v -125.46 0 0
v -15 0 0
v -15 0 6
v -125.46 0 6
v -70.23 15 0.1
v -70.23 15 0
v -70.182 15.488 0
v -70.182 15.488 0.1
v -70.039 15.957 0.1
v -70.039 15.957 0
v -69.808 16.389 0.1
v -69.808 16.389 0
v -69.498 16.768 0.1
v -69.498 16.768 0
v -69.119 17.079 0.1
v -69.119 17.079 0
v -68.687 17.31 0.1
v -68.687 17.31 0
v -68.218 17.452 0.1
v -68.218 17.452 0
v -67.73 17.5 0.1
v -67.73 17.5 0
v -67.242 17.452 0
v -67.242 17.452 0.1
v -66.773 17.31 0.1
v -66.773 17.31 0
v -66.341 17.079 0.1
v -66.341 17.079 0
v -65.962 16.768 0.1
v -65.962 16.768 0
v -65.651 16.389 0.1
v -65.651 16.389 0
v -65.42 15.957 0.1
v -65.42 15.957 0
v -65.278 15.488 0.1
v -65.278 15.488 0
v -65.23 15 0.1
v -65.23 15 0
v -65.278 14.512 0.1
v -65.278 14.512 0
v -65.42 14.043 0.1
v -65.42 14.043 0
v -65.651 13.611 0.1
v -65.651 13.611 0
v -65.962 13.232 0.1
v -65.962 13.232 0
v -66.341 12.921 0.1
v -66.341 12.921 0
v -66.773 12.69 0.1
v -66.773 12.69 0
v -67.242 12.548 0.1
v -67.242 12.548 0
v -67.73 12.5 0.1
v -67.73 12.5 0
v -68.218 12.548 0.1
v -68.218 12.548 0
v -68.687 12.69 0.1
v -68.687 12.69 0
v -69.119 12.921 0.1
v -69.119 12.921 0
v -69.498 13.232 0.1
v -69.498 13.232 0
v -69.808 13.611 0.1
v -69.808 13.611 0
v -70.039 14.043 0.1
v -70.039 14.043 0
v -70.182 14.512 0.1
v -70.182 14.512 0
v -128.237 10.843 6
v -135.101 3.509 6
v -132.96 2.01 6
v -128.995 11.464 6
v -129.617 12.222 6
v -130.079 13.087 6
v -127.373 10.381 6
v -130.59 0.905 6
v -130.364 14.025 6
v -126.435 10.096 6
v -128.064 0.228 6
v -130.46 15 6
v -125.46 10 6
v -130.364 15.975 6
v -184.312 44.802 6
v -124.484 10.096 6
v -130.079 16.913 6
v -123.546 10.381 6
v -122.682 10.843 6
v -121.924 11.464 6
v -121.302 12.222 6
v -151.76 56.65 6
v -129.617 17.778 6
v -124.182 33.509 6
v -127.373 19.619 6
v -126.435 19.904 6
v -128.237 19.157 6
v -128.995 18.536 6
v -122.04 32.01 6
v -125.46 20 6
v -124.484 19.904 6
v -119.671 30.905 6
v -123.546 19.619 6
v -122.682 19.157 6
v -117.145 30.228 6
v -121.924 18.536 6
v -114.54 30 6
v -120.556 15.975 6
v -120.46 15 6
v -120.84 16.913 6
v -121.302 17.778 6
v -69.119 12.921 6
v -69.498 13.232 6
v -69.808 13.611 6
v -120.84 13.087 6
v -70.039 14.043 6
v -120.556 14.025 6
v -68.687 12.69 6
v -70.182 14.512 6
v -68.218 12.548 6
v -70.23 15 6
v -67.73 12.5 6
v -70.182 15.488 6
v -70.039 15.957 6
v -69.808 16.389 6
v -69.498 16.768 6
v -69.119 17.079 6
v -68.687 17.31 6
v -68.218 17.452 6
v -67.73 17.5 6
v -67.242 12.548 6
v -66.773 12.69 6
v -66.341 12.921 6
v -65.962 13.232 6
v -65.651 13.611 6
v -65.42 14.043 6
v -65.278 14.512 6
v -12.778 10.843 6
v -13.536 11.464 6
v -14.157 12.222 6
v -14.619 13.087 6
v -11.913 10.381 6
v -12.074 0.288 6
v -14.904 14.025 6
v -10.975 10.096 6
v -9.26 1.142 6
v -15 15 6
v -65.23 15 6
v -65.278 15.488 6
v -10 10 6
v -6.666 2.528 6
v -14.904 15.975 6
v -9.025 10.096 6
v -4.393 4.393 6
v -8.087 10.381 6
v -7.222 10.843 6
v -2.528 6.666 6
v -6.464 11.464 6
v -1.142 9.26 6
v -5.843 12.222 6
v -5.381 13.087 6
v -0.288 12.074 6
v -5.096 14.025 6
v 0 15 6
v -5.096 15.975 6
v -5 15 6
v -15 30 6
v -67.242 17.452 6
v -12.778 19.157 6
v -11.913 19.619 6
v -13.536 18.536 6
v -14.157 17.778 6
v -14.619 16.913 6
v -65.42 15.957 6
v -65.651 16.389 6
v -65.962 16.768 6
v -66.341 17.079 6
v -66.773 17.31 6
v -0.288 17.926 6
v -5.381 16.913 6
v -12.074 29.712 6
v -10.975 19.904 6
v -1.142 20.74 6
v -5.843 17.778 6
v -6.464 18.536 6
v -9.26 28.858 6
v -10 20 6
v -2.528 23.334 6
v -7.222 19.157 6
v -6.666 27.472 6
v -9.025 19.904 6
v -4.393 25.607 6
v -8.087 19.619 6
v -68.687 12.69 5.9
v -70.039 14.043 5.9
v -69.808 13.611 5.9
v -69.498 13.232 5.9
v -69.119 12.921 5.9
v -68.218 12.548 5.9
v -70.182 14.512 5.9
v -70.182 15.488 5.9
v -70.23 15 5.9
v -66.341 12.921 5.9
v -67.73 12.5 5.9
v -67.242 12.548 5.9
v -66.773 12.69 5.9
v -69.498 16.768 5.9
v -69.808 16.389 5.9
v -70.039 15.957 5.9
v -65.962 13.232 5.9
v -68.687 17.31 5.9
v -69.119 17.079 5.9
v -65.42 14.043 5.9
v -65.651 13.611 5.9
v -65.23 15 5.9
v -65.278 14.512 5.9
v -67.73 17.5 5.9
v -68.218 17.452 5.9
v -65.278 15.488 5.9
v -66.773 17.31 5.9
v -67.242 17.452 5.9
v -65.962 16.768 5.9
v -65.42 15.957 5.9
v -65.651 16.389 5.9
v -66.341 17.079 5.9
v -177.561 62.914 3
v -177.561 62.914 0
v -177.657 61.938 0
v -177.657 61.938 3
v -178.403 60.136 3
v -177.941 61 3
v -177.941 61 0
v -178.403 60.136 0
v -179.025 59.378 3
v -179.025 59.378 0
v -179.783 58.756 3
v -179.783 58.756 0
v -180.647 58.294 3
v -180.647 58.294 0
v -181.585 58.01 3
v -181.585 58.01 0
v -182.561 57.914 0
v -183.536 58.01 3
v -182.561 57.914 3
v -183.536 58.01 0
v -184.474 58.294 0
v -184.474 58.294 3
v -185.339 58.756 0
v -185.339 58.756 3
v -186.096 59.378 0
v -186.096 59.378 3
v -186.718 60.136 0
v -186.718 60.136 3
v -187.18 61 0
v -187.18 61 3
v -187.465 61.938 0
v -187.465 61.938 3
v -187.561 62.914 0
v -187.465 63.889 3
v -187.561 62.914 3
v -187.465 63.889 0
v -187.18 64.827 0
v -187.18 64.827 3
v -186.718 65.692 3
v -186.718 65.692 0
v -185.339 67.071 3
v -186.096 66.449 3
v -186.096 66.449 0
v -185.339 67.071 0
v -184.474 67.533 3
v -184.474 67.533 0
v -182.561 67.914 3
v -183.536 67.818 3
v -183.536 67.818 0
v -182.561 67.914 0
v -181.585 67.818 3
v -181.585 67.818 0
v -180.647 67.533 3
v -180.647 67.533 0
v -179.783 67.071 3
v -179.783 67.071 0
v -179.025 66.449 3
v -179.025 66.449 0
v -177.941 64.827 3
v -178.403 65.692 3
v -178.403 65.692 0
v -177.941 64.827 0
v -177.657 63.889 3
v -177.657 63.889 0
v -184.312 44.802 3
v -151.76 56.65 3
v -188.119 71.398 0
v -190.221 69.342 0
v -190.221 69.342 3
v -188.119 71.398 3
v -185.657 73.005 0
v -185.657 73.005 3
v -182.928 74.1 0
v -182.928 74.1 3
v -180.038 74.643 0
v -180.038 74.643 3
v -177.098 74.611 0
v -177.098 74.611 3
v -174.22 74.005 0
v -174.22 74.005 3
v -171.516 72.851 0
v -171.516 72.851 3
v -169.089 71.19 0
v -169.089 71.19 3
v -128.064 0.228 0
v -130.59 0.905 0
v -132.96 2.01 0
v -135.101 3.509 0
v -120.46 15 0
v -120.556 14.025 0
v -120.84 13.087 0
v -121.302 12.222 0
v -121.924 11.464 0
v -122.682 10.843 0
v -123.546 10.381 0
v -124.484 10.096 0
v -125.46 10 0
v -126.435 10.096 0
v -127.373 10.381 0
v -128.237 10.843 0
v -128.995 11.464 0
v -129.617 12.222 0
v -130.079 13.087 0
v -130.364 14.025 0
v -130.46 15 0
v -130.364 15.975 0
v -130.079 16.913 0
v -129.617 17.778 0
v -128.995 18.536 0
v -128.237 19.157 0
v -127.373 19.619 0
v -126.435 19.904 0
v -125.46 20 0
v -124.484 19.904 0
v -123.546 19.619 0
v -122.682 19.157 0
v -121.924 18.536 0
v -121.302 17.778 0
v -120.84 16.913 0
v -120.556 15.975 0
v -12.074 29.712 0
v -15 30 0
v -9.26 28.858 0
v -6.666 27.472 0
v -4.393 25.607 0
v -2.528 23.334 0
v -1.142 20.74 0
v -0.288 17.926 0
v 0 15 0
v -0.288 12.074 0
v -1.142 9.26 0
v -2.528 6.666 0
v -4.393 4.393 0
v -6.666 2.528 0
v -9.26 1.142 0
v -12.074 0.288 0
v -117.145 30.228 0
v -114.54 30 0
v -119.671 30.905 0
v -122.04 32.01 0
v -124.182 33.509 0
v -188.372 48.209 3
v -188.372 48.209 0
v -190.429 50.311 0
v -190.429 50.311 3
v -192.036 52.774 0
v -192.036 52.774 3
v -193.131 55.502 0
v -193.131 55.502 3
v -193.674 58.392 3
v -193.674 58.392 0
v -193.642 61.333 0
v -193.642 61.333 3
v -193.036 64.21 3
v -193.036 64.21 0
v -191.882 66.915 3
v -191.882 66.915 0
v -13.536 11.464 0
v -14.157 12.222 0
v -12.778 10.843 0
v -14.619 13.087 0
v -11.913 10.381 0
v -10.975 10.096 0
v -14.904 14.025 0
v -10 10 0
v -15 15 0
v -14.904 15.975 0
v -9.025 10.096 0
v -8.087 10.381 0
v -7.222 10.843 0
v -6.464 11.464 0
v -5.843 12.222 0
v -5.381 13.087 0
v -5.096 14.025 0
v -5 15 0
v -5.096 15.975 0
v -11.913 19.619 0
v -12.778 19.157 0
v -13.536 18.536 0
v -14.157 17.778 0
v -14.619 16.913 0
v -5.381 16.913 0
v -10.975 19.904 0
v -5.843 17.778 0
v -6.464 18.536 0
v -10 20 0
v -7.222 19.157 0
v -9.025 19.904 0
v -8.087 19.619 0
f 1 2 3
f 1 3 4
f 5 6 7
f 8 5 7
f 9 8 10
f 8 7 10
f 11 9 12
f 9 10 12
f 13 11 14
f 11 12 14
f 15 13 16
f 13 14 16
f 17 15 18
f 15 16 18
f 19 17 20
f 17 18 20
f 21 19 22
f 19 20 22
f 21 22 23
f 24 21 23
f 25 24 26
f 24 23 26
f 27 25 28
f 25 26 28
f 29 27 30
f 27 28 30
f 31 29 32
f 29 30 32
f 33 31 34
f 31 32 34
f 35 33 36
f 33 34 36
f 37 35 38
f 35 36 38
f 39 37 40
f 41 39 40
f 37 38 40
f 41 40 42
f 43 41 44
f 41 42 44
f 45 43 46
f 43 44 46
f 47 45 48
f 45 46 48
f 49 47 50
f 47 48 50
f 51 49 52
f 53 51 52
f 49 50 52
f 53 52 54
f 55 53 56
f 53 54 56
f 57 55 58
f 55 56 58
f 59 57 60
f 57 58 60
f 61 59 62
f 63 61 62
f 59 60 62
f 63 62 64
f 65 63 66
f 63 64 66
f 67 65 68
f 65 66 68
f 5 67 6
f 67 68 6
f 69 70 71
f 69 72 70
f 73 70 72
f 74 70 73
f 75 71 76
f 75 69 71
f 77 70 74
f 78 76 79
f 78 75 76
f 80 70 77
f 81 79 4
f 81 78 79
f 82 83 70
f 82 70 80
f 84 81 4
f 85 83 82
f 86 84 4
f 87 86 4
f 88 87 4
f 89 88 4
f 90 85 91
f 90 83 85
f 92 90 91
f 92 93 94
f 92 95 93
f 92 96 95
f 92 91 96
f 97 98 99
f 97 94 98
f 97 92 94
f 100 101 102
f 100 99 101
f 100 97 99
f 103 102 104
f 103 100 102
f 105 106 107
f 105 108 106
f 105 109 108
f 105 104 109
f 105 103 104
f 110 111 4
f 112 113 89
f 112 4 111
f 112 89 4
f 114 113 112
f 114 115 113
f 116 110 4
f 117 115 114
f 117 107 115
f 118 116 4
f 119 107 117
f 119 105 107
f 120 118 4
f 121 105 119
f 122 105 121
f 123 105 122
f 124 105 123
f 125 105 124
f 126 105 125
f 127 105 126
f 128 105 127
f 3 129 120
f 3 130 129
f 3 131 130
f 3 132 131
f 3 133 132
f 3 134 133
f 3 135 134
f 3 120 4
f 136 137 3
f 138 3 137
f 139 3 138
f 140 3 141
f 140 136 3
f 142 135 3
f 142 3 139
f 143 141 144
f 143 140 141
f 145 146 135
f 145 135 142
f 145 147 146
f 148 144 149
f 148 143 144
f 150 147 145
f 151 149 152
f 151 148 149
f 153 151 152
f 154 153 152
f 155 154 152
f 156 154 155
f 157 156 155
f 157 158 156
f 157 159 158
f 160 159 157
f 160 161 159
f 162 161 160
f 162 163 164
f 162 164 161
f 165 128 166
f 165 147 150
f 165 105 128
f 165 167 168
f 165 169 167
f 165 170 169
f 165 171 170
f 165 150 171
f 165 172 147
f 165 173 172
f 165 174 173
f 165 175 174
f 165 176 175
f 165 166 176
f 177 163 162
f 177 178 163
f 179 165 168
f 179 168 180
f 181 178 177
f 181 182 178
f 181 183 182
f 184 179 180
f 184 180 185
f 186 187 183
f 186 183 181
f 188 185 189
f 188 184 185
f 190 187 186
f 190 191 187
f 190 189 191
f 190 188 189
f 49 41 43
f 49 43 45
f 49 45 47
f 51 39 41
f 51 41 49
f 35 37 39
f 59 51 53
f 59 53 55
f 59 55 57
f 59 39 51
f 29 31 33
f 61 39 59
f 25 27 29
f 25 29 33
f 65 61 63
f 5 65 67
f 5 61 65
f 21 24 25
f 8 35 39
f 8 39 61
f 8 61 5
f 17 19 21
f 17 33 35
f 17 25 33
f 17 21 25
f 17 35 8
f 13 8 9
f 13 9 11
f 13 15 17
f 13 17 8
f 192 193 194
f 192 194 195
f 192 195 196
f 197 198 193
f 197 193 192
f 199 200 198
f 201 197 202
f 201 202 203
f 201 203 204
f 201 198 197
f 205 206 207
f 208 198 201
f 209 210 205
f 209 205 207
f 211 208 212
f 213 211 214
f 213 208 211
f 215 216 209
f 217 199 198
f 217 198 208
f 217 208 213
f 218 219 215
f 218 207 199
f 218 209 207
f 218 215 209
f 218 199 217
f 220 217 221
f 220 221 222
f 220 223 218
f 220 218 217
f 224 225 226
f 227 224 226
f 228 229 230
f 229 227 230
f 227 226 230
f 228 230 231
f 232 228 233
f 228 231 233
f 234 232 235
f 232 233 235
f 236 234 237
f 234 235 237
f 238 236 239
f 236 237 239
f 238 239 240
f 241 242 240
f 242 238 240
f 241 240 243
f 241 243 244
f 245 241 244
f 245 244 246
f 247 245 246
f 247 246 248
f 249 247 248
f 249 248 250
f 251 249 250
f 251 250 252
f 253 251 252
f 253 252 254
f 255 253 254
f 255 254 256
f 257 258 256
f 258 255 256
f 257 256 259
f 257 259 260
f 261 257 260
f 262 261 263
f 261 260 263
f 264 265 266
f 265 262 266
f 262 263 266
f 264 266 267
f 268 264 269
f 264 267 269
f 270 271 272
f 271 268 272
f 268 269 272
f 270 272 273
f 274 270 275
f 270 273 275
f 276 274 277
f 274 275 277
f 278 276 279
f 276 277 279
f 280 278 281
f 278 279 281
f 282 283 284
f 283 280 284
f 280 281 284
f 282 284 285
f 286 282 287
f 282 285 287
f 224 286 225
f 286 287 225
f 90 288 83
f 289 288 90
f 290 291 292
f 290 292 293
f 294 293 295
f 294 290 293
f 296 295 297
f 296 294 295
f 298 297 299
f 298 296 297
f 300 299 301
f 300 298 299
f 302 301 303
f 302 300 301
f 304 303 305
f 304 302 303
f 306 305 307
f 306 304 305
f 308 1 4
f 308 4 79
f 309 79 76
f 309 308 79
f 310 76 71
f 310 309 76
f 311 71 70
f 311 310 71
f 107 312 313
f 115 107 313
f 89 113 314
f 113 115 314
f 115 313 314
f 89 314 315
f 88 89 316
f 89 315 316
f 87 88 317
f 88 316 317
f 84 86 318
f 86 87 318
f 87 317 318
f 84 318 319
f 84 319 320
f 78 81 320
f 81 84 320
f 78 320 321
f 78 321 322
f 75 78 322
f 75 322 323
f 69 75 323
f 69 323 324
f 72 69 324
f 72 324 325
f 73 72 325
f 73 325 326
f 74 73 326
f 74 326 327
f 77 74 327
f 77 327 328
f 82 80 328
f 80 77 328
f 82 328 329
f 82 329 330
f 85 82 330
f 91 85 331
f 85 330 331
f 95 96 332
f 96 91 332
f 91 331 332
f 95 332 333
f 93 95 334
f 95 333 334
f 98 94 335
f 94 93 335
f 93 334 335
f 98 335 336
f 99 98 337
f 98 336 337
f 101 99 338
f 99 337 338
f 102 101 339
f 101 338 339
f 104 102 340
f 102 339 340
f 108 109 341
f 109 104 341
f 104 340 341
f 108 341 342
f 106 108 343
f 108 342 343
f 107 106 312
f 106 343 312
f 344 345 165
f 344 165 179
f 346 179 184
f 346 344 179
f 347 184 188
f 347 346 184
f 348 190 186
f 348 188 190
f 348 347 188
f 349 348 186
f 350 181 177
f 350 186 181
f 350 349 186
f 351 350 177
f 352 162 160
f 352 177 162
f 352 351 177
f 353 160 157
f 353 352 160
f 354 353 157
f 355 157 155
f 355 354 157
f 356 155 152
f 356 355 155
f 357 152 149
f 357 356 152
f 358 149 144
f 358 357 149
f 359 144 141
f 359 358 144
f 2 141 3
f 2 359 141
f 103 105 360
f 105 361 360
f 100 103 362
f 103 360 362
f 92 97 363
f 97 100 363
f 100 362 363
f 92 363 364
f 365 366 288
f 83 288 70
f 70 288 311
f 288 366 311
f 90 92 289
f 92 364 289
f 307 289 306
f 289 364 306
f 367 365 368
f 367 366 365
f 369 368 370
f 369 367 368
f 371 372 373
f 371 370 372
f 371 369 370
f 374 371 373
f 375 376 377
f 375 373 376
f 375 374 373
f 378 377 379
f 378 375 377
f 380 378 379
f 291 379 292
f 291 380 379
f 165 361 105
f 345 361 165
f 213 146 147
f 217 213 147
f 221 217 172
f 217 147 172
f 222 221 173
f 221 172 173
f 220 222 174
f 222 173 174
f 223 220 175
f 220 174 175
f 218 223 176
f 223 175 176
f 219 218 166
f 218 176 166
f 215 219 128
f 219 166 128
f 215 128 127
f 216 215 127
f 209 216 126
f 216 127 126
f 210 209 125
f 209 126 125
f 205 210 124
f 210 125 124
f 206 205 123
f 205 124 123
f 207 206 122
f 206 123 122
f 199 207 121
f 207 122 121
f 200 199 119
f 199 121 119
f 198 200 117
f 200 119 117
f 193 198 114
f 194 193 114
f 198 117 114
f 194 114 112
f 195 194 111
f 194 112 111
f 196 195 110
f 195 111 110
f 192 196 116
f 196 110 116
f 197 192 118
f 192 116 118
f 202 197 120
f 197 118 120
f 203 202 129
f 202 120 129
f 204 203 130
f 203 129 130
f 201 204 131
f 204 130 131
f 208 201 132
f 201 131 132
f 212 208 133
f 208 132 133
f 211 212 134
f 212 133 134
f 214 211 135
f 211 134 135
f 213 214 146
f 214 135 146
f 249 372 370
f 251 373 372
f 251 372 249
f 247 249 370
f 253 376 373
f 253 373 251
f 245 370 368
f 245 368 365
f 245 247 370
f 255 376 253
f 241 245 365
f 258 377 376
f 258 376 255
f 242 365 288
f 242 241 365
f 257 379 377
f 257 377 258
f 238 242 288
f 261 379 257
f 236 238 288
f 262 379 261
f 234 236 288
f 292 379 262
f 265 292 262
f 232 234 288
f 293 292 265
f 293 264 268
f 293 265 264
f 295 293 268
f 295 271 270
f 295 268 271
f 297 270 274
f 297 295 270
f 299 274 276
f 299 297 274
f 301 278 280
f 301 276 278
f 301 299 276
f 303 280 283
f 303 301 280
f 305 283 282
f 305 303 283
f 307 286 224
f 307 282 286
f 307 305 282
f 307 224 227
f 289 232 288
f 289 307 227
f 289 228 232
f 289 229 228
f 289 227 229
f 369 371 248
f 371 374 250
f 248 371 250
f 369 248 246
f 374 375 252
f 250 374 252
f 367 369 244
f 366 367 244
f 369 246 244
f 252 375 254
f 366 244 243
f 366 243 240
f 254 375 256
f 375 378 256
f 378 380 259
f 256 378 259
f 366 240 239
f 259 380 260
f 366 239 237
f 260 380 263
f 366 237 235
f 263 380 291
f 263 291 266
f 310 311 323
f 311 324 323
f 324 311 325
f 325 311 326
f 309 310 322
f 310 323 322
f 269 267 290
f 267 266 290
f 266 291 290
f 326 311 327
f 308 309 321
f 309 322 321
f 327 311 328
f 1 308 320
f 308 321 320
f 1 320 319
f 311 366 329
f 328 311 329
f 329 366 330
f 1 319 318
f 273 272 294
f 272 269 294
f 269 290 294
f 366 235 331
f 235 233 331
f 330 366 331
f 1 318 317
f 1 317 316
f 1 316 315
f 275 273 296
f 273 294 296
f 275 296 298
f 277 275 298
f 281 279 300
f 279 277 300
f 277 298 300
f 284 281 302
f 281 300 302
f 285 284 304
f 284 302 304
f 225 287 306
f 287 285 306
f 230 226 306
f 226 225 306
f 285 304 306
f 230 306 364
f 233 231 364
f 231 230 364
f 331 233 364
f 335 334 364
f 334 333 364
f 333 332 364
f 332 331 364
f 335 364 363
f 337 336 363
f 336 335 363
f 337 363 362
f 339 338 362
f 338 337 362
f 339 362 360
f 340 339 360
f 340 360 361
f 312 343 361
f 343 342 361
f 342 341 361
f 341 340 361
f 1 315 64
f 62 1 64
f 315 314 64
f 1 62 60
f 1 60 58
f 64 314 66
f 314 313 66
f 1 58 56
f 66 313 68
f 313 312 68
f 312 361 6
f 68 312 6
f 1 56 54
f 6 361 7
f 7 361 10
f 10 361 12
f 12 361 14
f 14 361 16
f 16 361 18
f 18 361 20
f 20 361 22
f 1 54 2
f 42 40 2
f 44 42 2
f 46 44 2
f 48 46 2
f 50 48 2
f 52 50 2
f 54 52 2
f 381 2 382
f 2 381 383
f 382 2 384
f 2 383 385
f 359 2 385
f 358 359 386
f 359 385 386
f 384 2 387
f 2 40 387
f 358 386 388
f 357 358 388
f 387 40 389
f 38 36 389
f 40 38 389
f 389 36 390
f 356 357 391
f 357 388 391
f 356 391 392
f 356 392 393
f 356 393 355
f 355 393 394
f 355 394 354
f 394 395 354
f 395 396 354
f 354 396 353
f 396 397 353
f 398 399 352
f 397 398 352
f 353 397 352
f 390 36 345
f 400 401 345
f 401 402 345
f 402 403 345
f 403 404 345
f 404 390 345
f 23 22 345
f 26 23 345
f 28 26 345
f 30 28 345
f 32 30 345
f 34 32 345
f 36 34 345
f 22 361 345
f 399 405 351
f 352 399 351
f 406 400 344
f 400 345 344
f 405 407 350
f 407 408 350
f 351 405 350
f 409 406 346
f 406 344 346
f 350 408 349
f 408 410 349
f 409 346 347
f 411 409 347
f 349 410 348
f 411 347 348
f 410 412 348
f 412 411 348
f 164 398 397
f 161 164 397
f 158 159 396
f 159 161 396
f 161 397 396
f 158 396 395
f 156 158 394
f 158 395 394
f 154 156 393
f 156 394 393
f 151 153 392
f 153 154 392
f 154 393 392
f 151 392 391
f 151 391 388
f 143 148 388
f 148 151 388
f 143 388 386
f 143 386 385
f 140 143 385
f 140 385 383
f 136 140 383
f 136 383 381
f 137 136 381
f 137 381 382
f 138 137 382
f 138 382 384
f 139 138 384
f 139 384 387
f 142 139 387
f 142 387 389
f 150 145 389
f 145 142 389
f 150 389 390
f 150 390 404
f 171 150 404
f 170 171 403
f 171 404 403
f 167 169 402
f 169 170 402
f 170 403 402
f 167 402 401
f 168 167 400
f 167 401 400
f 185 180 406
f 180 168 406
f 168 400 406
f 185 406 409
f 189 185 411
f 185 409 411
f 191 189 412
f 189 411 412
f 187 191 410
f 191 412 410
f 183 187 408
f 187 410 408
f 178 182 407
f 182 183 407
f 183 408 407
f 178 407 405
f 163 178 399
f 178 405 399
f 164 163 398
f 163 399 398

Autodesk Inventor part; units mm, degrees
ref_plane "YZ Plane" through (0, 0, 0) normal (1, 0, 0) x (0, 1, 0)
ref_plane "XZ Plane" through (0, 0, 0) normal (0, 1, 0) x (-1, 0, 0)
ref_plane "XY Plane" through (0, 0, 0) normal (0, 0, 1) x (1, 0, 0)
sketch "Sketch1" plane through (0, 0, 0) normal (0, 0, 1) x (1, 0, 0)
  line L0 (-15, 0) -> (-125.4596, 0)
  line L1 (-130.9191, 0) -> (-130.9191, 30)
  line L2 (-114.5404, 30) -> (-15, 30)
  line L3 (0, 15) -> (0, 15)
  line L4 (-130.9191, 0) -> (-111.6355, 22.9813)
  line L5 (-111.6355, 22.9813) -> (-120, 30)
  line L6 (-190.2213, 69.3416) -> (-190.2213, 69.3416)
  line L7 (-188.3724, 48.2091) -> (-135.1014, 3.5093)
  line L8 (-124.1823, 33.5093) -> (-169.0888, 71.1904)
  circle A0 centre (-182.5608, 62.9137) radius 5
  circle A1 centre (-10, 15) radius 5
  arc A2 (0, 15) -> (-15, 30) centre (-15, 15) ccw
  arc A3 (-15, 0) -> (0, 15) centre (-15, 15) ccw
  arc A4 (-169.0888, 71.1904) -> (-190.2213, 69.3416) centre (-178.7306, 59.6997) ccw
  arc A5 (-190.2213, 69.3416) -> (-188.3724, 48.2091) centre (-178.7306, 59.6997) ccw
  arc A6 (-124.1823, 33.5093) -> (-114.5404, 30) centre (-114.5404, 45) ccw
  arc A7 (-135.1014, 3.5093) -> (-125.4596, 0) centre (-125.4596, 15) ccw
  line L9 (-15, 15) -> (-82.4661, 15) construction
  line L10 (-178.7306, 59.6997) -> (-70.1019, -31.4506) construction
  circle A8 centre (-125.4596, 15) radius 5
  point P0 (0, 0)
  point P1 (0, 30)
  point P2 (-199.8631, 57.8509)
  point P3 (0, 15)
  point P4 (-190.2213, 69.3416)
  dimension "d0" = 30
  dimension "d2" = 30
  dimension "d3" = 50
  dimension "d4" = 120
  dimension "d5" = 90
  dimension "d6" = 10
  dimension "d7" = 10
  dimension "d8" = 10
  dimension "d9" = 10
  dimension "d10" = 15
  dimension "d13" = 10
  dimension "d14" = 15
  dimension "d15" = 15
extrude "Extrusion1" add sketch "Sketch1" along normal blind 3 contours L0 A7 L7 A5 A4 L8 A6 L2 A2 A3
sketch "Sketch2" plane through (0, 0, 3) normal (0, 0, 1) x (1, 0, 0)
  point P0 (0, 0)
sketch "Sketch3" plane through (0, 0, 3) normal (0, 0, 1) x (1, 0, 0)
  line L0 (-125.4596, 0) -> (-15, 0) projected
  arc A0 (-15, 0) -> (-15, 30) centre (-15, 15) ccw projected
  line L1 (-15, 30) -> (-114.5404, 30) projected
  arc A1 (-124.1823, 33.5093) -> (-114.5404, 30) centre (-114.5404, 45) ccw projected
  line L2 (-124.1823, 33.5093) -> (-169.0888, 71.1904) projected
  arc A2 (-169.0888, 71.1904) -> (-188.3724, 48.2091) centre (-178.7306, 59.6997) ccw projected
  line L3 (-188.3724, 48.2091) -> (-135.1014, 3.5093) projected
  arc A3 (-135.1014, 3.5093) -> (-125.4596, 0) centre (-125.4596, 15) ccw projected
  circle A4 centre (-125.4596, 15) radius 5 projected
  circle A5 centre (-10, 15) radius 5 projected
  circle A6 centre (-182.5608, 62.9137) radius 5 projected
  line L4 (-248.5616, 21.4167) -> (-81.5166, 82.2161)
  line L5 (-124.1823, 33.5093) -> (-169.0888, 71.1904) projected
  point P0 (0, 0)
  point P1 (-151.7599, 56.6497)
  point P2 (-151.7599, 56.6497)
  point P3 (-184.3118, 44.8018)
  dimension "d16" = 60
  dimension "d17" = 36
extrude "Extrusion2" add sketch "Sketch3" along normal blind 3 contours A3 L3 L4 L2 A1 L1 A0 L0
sketch "Sketch4" plane through (0, 0, 0) normal (0, 0, -1) x (-1, 0, 0)
  circle A0 centre (182.5608, 62.9137) radius 5 projected
  point P0 (0, 0)
extrude "Extrusion3" [suppressed]
sketch "Sketch5" plane through (0, 0, 6) normal (0, 0, 1) x (1, 0, 0)
  circle A0 centre (-67.7298, 15) radius 2.5
  circle A1 centre (-10, 15) radius 5 projected
  circle A2 centre (-125.4596, 15) radius 5 projected
  point P0 (0, 0)
  dimension "d22" = 115.4595
  dimension "d23" = 57.7298
  dimension "d28" = 5
extrude "Extrusion4" cut sketch "Sketch5" against normal blind 0.1 contours A0
sketch "Sketch6" plane through (0, 0, 0) normal (0, 0, -1) x (-1, 0, 0)
  circle A0 centre (67.7298, 15) radius 2.5 projected
  point P0 (0, 0)
extrude "Extrusion5" cut sketch "Sketch6" against normal blind 0.1
equation "\"d2\" = d0"
equation "\"d7\" = d6"
equation "\"d8\" = d6"
equation "\"d9\" = d7"
equation "\"d10\" = 0.5 * d0"
equation "\"d13\" = d8"
equation "\"d14\" = 0.5 * d0"
equation "\"d15\" = d14"
equation "\"d17\" = 1.2 * d0"
equation "\"d18\" = d11"
equation "\"d20\" = 4 * d11"
equation "\"d23\" = 0.5 * d22"
equation "\"d11\" = 3"
properties part number "GripP1"
